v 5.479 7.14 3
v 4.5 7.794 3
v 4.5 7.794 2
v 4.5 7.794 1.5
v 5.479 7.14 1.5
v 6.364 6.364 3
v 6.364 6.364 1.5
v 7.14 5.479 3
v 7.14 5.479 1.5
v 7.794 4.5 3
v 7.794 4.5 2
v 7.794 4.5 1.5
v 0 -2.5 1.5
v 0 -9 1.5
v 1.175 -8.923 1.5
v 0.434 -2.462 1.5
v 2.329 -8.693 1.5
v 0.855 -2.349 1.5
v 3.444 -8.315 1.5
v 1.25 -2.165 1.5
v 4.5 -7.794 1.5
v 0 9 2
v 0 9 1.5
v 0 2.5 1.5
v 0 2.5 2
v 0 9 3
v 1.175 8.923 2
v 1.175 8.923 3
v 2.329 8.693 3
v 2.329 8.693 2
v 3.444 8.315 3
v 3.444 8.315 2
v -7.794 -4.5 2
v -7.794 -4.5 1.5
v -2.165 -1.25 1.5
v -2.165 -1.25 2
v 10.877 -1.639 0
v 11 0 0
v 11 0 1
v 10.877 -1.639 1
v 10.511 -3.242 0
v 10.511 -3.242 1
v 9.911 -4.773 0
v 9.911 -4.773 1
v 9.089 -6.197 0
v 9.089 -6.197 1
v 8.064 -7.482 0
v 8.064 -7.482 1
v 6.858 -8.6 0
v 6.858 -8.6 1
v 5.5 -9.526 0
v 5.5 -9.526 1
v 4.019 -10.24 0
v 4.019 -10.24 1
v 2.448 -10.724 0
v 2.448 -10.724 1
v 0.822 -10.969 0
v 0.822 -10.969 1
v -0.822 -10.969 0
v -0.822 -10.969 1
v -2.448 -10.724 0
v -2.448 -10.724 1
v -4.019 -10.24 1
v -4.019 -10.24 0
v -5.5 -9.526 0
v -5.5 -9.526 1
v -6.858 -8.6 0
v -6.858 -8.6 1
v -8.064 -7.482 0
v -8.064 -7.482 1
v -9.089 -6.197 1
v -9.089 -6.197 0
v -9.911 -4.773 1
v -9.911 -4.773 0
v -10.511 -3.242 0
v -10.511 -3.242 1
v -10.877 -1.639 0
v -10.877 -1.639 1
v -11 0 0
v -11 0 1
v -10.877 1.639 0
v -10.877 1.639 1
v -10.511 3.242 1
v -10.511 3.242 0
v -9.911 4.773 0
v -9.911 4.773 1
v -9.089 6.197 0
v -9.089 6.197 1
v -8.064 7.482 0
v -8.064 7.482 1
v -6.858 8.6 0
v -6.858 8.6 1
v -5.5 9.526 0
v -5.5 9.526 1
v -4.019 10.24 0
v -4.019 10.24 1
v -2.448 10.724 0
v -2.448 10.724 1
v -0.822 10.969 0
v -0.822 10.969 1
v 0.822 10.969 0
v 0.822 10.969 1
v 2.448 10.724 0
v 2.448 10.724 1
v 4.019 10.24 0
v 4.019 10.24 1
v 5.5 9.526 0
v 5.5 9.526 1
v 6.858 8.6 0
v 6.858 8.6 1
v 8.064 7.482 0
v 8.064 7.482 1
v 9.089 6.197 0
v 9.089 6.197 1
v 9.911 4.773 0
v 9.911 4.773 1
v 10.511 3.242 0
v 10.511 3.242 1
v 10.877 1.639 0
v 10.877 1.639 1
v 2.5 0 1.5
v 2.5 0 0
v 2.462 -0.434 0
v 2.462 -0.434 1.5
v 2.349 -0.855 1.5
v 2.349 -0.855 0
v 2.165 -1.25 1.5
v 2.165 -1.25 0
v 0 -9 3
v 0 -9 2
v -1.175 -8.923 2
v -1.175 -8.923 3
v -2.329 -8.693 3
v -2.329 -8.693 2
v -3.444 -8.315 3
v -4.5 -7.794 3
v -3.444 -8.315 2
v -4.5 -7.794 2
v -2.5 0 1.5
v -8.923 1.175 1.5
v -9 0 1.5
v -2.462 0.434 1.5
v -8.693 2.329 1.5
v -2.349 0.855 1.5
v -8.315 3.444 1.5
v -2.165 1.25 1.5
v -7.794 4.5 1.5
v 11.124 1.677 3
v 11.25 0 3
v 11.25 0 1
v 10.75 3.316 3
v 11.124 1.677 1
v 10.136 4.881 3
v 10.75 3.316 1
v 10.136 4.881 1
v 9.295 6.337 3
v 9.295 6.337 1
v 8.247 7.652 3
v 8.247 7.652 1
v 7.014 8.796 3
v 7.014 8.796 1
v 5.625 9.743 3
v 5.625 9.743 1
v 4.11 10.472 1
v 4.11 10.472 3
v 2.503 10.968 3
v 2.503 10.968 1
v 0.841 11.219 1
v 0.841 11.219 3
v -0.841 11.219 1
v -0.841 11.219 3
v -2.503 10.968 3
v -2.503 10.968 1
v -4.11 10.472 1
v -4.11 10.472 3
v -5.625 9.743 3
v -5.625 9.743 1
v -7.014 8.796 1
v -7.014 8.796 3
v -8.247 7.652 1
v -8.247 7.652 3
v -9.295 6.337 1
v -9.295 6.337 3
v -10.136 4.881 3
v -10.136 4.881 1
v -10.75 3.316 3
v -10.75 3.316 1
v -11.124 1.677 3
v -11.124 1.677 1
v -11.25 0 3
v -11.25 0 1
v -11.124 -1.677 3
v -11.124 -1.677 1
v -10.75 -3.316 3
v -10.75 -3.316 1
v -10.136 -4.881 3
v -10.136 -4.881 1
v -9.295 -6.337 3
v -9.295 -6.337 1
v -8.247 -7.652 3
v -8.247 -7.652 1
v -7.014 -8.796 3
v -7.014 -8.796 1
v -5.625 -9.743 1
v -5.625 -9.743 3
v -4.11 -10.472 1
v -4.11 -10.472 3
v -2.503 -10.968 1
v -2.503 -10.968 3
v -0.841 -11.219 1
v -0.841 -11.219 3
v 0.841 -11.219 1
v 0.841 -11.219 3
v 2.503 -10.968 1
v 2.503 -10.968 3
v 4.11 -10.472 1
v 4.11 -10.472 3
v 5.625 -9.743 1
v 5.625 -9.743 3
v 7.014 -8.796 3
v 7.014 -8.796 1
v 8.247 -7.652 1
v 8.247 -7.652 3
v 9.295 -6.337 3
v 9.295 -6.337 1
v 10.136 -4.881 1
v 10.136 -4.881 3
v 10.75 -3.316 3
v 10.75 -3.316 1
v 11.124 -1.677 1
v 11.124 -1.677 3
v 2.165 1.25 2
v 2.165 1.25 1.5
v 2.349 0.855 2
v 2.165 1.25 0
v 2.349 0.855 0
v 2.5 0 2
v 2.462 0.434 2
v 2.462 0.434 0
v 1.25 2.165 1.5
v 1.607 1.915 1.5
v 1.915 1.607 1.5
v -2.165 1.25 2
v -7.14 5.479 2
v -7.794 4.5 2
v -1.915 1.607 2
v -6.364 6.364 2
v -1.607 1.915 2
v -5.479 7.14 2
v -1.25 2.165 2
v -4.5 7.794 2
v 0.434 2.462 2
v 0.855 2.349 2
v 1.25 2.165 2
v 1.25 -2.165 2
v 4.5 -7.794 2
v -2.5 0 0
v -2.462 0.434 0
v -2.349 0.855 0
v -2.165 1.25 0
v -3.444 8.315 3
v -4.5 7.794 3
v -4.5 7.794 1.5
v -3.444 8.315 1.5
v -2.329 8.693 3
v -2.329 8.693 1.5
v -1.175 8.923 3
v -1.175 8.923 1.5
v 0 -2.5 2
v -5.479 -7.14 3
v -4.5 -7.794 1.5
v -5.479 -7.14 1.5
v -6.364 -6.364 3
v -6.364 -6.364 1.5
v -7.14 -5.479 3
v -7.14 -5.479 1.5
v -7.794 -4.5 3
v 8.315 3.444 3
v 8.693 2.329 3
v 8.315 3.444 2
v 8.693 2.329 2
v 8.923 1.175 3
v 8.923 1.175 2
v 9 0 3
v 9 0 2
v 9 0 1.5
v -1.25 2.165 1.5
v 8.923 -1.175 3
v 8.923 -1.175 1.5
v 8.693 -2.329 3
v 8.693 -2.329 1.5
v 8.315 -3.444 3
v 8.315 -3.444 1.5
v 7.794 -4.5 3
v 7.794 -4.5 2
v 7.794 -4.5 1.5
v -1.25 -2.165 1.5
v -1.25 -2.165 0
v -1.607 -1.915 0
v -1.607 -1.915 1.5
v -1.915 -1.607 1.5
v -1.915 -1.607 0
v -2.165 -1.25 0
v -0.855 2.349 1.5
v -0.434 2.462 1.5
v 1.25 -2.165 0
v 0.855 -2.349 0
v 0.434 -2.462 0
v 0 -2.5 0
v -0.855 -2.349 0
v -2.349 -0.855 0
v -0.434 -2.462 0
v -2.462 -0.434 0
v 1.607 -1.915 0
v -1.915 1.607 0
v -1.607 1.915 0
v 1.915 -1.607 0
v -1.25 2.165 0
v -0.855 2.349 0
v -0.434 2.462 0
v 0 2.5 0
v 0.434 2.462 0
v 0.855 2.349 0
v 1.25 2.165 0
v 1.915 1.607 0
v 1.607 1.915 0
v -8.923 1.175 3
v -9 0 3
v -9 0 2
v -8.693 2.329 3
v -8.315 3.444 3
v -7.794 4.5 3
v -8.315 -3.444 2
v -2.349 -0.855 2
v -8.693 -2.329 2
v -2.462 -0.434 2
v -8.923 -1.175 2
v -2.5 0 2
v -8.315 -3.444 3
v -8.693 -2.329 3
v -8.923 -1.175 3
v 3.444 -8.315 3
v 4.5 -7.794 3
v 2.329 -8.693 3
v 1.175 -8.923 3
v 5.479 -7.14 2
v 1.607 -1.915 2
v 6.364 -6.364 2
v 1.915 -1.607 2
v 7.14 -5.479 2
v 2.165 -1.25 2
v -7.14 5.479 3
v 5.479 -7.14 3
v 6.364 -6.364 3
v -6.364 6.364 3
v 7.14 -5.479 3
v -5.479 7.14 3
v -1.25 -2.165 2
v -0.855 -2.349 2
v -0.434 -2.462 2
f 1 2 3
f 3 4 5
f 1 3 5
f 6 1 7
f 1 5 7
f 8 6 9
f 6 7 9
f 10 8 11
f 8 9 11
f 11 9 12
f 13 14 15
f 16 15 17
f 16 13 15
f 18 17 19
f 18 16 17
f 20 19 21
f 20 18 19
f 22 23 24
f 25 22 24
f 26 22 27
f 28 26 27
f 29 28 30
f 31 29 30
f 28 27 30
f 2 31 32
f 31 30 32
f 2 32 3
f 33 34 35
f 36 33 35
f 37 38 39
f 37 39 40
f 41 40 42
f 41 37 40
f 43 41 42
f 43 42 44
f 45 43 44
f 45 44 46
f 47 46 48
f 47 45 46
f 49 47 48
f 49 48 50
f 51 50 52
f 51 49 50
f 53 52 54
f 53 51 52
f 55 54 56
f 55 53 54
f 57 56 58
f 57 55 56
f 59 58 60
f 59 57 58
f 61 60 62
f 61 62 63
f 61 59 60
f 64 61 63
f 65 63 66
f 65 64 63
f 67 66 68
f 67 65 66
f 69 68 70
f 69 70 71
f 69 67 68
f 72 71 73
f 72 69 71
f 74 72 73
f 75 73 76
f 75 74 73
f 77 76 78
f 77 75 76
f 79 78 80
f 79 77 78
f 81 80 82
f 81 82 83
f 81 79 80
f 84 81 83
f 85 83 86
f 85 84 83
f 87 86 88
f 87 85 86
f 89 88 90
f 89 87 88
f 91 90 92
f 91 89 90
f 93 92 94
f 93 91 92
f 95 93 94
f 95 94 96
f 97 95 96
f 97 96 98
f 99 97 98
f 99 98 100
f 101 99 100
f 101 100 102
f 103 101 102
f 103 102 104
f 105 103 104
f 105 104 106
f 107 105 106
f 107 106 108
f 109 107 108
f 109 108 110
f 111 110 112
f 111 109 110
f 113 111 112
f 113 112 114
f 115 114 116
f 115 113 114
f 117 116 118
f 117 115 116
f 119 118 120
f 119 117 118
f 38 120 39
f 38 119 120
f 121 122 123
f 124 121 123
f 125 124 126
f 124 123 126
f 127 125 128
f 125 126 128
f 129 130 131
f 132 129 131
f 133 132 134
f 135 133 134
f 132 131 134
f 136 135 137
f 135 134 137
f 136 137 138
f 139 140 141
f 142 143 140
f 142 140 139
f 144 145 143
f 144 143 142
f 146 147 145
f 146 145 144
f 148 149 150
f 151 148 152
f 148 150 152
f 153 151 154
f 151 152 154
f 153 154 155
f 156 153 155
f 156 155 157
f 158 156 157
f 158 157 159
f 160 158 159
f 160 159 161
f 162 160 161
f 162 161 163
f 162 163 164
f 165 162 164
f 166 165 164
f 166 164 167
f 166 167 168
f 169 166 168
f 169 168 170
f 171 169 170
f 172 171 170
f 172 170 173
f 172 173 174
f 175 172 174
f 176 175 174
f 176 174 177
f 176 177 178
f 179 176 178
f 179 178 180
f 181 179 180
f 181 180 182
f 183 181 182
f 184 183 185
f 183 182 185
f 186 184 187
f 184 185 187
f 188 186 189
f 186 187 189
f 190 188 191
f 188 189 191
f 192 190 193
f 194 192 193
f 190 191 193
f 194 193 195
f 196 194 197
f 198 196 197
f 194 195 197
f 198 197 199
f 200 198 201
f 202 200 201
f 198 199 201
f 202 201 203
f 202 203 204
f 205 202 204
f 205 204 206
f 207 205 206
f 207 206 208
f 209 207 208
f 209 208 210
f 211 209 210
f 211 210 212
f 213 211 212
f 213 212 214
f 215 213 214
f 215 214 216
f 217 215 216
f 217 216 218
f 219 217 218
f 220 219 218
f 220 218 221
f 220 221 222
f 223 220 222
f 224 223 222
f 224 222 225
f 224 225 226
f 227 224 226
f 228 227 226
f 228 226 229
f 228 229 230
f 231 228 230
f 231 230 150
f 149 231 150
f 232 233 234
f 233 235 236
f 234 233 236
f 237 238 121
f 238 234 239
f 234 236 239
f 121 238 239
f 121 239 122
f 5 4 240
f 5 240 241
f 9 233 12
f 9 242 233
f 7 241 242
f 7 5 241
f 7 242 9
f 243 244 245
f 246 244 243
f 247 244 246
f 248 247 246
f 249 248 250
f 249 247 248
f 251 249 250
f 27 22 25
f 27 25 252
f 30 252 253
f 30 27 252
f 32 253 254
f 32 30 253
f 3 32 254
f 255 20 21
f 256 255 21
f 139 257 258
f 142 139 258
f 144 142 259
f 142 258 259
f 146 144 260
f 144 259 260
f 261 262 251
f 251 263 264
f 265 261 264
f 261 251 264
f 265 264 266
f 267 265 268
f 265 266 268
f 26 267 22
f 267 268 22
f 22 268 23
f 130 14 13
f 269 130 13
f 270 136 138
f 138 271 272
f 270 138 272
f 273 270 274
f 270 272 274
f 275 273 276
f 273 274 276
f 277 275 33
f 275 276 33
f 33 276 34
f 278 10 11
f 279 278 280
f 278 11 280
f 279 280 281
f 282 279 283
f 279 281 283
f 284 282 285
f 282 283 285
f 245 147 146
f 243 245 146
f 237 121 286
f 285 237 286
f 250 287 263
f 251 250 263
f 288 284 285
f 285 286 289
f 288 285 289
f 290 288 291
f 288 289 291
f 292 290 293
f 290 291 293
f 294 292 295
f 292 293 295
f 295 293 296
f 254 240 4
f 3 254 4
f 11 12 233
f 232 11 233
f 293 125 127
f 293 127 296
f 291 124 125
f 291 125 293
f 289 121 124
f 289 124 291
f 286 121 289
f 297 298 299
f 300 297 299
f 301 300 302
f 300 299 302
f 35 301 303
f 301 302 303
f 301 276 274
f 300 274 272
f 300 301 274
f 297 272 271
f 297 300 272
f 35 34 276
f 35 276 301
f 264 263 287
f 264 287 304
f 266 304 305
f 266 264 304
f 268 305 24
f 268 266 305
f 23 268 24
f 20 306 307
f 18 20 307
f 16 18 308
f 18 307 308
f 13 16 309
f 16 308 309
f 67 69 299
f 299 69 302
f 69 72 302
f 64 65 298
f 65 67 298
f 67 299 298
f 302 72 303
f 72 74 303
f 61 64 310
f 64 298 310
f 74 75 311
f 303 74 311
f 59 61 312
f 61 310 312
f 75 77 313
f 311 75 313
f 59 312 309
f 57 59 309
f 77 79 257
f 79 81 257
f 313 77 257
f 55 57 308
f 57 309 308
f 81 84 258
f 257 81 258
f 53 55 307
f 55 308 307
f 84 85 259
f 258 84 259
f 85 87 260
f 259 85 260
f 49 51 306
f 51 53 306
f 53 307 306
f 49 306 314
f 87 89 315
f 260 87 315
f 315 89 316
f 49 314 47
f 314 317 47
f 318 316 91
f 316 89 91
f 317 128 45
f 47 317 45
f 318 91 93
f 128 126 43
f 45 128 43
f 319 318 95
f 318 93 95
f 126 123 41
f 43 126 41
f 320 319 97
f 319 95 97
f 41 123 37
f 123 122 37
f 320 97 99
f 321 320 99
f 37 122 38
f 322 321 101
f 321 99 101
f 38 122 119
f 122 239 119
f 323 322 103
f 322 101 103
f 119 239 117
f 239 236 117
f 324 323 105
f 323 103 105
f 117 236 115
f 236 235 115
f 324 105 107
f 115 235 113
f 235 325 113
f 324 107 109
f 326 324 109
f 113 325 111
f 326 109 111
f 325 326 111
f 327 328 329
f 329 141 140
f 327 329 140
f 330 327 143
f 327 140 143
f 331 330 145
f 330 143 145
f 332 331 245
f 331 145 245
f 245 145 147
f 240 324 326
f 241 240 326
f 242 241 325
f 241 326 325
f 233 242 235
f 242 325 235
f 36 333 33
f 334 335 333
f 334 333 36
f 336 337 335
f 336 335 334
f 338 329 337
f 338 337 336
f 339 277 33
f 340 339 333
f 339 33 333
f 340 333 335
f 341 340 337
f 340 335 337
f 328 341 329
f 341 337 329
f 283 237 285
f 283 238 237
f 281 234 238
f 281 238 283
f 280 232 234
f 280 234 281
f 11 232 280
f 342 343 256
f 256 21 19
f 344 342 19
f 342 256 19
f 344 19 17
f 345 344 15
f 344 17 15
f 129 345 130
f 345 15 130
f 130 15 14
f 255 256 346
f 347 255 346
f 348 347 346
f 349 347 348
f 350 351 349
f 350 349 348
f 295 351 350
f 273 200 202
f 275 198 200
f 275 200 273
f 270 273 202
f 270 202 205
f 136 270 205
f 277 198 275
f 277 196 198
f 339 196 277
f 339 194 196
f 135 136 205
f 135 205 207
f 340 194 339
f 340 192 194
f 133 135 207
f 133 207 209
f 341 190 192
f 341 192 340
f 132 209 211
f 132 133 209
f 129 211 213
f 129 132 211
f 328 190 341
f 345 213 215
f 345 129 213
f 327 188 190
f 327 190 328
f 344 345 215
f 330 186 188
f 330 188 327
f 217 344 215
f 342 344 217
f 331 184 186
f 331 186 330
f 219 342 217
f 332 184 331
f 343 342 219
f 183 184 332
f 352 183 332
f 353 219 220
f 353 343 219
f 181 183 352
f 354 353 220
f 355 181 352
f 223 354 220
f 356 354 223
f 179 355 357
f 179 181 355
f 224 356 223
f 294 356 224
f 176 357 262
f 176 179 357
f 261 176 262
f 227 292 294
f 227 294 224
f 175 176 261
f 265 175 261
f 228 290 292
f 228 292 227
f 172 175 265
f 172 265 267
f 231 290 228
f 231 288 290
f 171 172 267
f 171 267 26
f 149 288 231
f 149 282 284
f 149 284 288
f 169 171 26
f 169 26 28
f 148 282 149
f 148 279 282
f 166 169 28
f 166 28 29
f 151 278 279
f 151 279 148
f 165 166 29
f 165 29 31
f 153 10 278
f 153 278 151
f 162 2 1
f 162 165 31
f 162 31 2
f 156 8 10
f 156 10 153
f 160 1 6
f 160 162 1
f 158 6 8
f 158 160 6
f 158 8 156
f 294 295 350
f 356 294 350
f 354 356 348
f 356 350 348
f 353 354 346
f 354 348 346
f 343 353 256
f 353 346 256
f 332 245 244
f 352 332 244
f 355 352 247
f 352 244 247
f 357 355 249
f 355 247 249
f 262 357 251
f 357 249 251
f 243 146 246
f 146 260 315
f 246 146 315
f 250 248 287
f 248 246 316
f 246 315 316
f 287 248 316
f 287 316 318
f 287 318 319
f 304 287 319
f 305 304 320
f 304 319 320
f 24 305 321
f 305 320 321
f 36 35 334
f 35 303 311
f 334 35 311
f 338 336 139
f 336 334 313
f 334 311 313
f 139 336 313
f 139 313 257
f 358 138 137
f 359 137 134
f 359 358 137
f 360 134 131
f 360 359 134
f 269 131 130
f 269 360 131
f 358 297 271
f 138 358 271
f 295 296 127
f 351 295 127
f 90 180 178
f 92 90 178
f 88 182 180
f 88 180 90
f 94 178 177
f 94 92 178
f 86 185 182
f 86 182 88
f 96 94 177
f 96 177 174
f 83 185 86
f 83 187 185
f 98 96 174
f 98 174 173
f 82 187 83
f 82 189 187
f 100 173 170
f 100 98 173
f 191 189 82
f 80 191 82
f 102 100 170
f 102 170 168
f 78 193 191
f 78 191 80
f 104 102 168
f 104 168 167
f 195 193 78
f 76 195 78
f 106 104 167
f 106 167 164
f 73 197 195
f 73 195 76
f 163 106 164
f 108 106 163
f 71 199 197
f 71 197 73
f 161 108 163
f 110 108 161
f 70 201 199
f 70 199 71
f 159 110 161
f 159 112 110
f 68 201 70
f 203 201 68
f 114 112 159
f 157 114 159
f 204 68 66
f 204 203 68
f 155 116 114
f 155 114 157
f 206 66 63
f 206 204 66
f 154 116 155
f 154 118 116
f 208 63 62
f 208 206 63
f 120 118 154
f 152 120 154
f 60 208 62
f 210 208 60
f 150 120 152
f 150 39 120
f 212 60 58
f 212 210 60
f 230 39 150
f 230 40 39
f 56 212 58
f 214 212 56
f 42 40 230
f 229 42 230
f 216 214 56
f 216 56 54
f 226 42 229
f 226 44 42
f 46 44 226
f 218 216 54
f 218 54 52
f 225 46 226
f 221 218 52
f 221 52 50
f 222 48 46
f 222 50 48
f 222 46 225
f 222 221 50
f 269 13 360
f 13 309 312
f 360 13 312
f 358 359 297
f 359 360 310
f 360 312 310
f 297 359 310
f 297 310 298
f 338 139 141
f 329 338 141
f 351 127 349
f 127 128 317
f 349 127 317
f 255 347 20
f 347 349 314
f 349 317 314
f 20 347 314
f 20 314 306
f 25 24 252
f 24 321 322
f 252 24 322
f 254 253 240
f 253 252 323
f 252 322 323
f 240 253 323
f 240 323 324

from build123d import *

# Parameters (mm, degrees)
F0_R     = 11.25
F1_DEPTH = 3
F2_DEPTH = 2
F3_DEPTH = 1.5
F4_R     = 11.25
F4_R_2   = 11
F5_DEPTH = 1


with BuildPart() as f1:
    # F0 (on Top) → F1 (new body)
    with BuildSketch(Plane.XY):
        Circle(F0_R)
        with BuildLine():
            ThreePointArc((7.7942286341, 4.5), (8.6933324366, 2.3293714059), (9, 0))
            ThreePointArc((9, 0), (8.6933324366, -2.3293714059), (7.7942286341, -4.5))
            ThreePointArc((7.7942286341, -4.5), (6.3639610307, -6.3639610307), (4.5, -7.7942286341))
            ThreePointArc((4.5, -7.7942286341), (2.3293714059, -8.6933324366), (0, -9))
            ThreePointArc((0, -9), (-2.3293714059, -8.6933324366), (-4.5, -7.7942286341))
            ThreePointArc((-4.5, -7.7942286341), (-6.3639610307, -6.3639610307), (-7.7942286341, -4.5))
            ThreePointArc((-7.7942286341, -4.5), (-8.6933324366, -2.3293714059), (-9, 0))
            ThreePointArc((-9, 0), (-8.6933324366, 2.3293714059), (-7.7942286341, 4.5))
            ThreePointArc((-7.7942286341, 4.5), (-6.3639610307, 6.3639610307), (-4.5, 7.7942286341))
            ThreePointArc((-4.5, 7.7942286341), (-2.3293714059, 8.6933324366), (0, 9))
            ThreePointArc((0, 9), (2.3293714059, 8.6933324366), (4.5, 7.7942286341))
            ThreePointArc((4.5, 7.7942286341), (6.3639610307, 6.3639610307), (7.7942286341, 4.5))
        make_face(mode=Mode.SUBTRACT)
    extrude(amount=F1_DEPTH)

    # F0 (on Top) → F2 (join)
    with BuildSketch(Plane.XY):
        with BuildLine():
            Line((-7.7942286341, 4.5), (-2.1650635095, 1.25))
            ThreePointArc((-2.1650635095, 1.25), (-1.767766953, 1.767766953), (-1.25, 2.1650635095))
            Line((-1.25, 2.1650635095), (-4.5, 7.7942286341))
            ThreePointArc((-4.5, 7.7942286341), (-6.3639610307, 6.3639610307), (-7.7942286341, 4.5))
        make_face()
        with BuildLine():
            Line((1.25, 2.1650635095), (4.5, 7.7942286341))
            ThreePointArc((4.5, 7.7942286341), (2.3293714059, 8.6933324366), (0, 9))
            Line((0, 9), (0, 2.5))
            ThreePointArc((0, 2.5), (0.6470476128, 2.4148145657), (1.25, 2.1650635095))
        make_face()
        with BuildLine():
            Line((2.5, 0), (9, 0))
            ThreePointArc((9, 0), (8.6933324366, 2.3293714059), (7.7942286341, 4.5))
            Line((7.7942286341, 4.5), (2.1650635095, 1.25))
            ThreePointArc((2.1650635095, 1.25), (2.4148145657, 0.6470476128), (2.5, 0))
        make_face()
        with BuildLine():
            ThreePointArc((4.5, -7.7942286341), (6.3639610307, -6.3639610307), (7.7942286341, -4.5))
            Line((7.7942286341, -4.5), (2.1650635095, -1.25))
            ThreePointArc((2.1650635095, -1.25), (1.767766953, -1.767766953), (1.25, -2.1650635095))
            Line((1.25, -2.1650635095), (4.5, -7.7942286341))
        make_face()
        with BuildLine():
            ThreePointArc((-4.5, -7.7942286341), (-2.3293714059, -8.6933324366), (0, -9))
            Line((0, -9), (0, -2.5))
            ThreePointArc((0, -2.5), (-0.6470476128, -2.4148145657), (-1.25, -2.1650635095))
            Line((-1.25, -2.1650635095), (-4.5, -7.7942286341))
        make_face()
        with BuildLine():
            ThreePointArc((-2.1650635095, -1.25), (-2.4148145657, -0.6470476128), (-2.5, 0))
            Line((-2.5, 0), (-9, 0))
            ThreePointArc((-9, 0), (-8.6933324366, -2.3293714059), (-7.7942286341, -4.5))
            Line((-7.7942286341, -4.5), (-2.1650635095, -1.25))
        make_face()
    extrude(amount=F2_DEPTH)

    # F0 (on Top) → F3 (join)
    with BuildSketch(Plane.XY):
        with BuildLine():
            Line((-9, 0), (-2.5, 0))
            ThreePointArc((-2.5, 0), (-2.4148145657, 0.6470476128), (-2.1650635095, 1.25))
            Line((-2.1650635095, 1.25), (-7.7942286341, 4.5))
            ThreePointArc((-7.7942286341, 4.5), (-8.6933324366, 2.3293714059), (-9, 0))
        make_face()
        with BuildLine():
            Line((0, 2.5), (0, 9))
            ThreePointArc((0, 9), (-2.3293714059, 8.6933324366), (-4.5, 7.7942286341))
            Line((-4.5, 7.7942286341), (-1.25, 2.1650635095))
            ThreePointArc((-1.25, 2.1650635095), (-0.6470476128, 2.4148145657), (0, 2.5))
        make_face()
        with BuildLine():
            Line((2.1650635095, 1.25), (7.7942286341, 4.5))
            ThreePointArc((7.7942286341, 4.5), (6.3639610307, 6.3639610307), (4.5, 7.7942286341))
            Line((4.5, 7.7942286341), (1.25, 2.1650635095))
            ThreePointArc((1.25, 2.1650635095), (1.767766953, 1.767766953), (2.1650635095, 1.25))
        make_face()
        with BuildLine():
            ThreePointArc((7.7942286341, -4.5), (8.6933324366, -2.3293714059), (9, 0))
            Line((9, 0), (2.5, 0))
            ThreePointArc((2.5, 0), (2.4148145657, -0.6470476128), (2.1650635095, -1.25))
            Line((2.1650635095, -1.25), (7.7942286341, -4.5))
        make_face()
        with BuildLine():
            ThreePointArc((0, -9), (2.3293714059, -8.6933324366), (4.5, -7.7942286341))
            Line((4.5, -7.7942286341), (1.25, -2.1650635095))
            ThreePointArc((1.25, -2.1650635095), (0.6470476128, -2.4148145657), (0, -2.5))
            Line((0, -2.5), (0, -9))
        make_face()
        with BuildLine():
            Line((-4.5, -7.7942286341), (-1.25, -2.1650635095))
            ThreePointArc((-1.25, -2.1650635095), (-1.767766953, -1.767766953), (-2.1650635095, -1.25))
            Line((-2.1650635095, -1.25), (-7.7942286341, -4.5))
            ThreePointArc((-7.7942286341, -4.5), (-6.3639610307, -6.3639610307), (-4.5, -7.7942286341))
        make_face()
    extrude(amount=F3_DEPTH)

    # F4 (on face) → F5 (cut)
    with BuildSketch(Plane(origin=(0, 0, 0), x_dir=(1, 0, 0), z_dir=(0, 0, -1))):
        Circle(F4_R)
        Circle(F4_R_2, mode=Mode.SUBTRACT)
    extrude(amount=-F5_DEPTH, mode=Mode.SUBTRACT)


solid = f1.part
